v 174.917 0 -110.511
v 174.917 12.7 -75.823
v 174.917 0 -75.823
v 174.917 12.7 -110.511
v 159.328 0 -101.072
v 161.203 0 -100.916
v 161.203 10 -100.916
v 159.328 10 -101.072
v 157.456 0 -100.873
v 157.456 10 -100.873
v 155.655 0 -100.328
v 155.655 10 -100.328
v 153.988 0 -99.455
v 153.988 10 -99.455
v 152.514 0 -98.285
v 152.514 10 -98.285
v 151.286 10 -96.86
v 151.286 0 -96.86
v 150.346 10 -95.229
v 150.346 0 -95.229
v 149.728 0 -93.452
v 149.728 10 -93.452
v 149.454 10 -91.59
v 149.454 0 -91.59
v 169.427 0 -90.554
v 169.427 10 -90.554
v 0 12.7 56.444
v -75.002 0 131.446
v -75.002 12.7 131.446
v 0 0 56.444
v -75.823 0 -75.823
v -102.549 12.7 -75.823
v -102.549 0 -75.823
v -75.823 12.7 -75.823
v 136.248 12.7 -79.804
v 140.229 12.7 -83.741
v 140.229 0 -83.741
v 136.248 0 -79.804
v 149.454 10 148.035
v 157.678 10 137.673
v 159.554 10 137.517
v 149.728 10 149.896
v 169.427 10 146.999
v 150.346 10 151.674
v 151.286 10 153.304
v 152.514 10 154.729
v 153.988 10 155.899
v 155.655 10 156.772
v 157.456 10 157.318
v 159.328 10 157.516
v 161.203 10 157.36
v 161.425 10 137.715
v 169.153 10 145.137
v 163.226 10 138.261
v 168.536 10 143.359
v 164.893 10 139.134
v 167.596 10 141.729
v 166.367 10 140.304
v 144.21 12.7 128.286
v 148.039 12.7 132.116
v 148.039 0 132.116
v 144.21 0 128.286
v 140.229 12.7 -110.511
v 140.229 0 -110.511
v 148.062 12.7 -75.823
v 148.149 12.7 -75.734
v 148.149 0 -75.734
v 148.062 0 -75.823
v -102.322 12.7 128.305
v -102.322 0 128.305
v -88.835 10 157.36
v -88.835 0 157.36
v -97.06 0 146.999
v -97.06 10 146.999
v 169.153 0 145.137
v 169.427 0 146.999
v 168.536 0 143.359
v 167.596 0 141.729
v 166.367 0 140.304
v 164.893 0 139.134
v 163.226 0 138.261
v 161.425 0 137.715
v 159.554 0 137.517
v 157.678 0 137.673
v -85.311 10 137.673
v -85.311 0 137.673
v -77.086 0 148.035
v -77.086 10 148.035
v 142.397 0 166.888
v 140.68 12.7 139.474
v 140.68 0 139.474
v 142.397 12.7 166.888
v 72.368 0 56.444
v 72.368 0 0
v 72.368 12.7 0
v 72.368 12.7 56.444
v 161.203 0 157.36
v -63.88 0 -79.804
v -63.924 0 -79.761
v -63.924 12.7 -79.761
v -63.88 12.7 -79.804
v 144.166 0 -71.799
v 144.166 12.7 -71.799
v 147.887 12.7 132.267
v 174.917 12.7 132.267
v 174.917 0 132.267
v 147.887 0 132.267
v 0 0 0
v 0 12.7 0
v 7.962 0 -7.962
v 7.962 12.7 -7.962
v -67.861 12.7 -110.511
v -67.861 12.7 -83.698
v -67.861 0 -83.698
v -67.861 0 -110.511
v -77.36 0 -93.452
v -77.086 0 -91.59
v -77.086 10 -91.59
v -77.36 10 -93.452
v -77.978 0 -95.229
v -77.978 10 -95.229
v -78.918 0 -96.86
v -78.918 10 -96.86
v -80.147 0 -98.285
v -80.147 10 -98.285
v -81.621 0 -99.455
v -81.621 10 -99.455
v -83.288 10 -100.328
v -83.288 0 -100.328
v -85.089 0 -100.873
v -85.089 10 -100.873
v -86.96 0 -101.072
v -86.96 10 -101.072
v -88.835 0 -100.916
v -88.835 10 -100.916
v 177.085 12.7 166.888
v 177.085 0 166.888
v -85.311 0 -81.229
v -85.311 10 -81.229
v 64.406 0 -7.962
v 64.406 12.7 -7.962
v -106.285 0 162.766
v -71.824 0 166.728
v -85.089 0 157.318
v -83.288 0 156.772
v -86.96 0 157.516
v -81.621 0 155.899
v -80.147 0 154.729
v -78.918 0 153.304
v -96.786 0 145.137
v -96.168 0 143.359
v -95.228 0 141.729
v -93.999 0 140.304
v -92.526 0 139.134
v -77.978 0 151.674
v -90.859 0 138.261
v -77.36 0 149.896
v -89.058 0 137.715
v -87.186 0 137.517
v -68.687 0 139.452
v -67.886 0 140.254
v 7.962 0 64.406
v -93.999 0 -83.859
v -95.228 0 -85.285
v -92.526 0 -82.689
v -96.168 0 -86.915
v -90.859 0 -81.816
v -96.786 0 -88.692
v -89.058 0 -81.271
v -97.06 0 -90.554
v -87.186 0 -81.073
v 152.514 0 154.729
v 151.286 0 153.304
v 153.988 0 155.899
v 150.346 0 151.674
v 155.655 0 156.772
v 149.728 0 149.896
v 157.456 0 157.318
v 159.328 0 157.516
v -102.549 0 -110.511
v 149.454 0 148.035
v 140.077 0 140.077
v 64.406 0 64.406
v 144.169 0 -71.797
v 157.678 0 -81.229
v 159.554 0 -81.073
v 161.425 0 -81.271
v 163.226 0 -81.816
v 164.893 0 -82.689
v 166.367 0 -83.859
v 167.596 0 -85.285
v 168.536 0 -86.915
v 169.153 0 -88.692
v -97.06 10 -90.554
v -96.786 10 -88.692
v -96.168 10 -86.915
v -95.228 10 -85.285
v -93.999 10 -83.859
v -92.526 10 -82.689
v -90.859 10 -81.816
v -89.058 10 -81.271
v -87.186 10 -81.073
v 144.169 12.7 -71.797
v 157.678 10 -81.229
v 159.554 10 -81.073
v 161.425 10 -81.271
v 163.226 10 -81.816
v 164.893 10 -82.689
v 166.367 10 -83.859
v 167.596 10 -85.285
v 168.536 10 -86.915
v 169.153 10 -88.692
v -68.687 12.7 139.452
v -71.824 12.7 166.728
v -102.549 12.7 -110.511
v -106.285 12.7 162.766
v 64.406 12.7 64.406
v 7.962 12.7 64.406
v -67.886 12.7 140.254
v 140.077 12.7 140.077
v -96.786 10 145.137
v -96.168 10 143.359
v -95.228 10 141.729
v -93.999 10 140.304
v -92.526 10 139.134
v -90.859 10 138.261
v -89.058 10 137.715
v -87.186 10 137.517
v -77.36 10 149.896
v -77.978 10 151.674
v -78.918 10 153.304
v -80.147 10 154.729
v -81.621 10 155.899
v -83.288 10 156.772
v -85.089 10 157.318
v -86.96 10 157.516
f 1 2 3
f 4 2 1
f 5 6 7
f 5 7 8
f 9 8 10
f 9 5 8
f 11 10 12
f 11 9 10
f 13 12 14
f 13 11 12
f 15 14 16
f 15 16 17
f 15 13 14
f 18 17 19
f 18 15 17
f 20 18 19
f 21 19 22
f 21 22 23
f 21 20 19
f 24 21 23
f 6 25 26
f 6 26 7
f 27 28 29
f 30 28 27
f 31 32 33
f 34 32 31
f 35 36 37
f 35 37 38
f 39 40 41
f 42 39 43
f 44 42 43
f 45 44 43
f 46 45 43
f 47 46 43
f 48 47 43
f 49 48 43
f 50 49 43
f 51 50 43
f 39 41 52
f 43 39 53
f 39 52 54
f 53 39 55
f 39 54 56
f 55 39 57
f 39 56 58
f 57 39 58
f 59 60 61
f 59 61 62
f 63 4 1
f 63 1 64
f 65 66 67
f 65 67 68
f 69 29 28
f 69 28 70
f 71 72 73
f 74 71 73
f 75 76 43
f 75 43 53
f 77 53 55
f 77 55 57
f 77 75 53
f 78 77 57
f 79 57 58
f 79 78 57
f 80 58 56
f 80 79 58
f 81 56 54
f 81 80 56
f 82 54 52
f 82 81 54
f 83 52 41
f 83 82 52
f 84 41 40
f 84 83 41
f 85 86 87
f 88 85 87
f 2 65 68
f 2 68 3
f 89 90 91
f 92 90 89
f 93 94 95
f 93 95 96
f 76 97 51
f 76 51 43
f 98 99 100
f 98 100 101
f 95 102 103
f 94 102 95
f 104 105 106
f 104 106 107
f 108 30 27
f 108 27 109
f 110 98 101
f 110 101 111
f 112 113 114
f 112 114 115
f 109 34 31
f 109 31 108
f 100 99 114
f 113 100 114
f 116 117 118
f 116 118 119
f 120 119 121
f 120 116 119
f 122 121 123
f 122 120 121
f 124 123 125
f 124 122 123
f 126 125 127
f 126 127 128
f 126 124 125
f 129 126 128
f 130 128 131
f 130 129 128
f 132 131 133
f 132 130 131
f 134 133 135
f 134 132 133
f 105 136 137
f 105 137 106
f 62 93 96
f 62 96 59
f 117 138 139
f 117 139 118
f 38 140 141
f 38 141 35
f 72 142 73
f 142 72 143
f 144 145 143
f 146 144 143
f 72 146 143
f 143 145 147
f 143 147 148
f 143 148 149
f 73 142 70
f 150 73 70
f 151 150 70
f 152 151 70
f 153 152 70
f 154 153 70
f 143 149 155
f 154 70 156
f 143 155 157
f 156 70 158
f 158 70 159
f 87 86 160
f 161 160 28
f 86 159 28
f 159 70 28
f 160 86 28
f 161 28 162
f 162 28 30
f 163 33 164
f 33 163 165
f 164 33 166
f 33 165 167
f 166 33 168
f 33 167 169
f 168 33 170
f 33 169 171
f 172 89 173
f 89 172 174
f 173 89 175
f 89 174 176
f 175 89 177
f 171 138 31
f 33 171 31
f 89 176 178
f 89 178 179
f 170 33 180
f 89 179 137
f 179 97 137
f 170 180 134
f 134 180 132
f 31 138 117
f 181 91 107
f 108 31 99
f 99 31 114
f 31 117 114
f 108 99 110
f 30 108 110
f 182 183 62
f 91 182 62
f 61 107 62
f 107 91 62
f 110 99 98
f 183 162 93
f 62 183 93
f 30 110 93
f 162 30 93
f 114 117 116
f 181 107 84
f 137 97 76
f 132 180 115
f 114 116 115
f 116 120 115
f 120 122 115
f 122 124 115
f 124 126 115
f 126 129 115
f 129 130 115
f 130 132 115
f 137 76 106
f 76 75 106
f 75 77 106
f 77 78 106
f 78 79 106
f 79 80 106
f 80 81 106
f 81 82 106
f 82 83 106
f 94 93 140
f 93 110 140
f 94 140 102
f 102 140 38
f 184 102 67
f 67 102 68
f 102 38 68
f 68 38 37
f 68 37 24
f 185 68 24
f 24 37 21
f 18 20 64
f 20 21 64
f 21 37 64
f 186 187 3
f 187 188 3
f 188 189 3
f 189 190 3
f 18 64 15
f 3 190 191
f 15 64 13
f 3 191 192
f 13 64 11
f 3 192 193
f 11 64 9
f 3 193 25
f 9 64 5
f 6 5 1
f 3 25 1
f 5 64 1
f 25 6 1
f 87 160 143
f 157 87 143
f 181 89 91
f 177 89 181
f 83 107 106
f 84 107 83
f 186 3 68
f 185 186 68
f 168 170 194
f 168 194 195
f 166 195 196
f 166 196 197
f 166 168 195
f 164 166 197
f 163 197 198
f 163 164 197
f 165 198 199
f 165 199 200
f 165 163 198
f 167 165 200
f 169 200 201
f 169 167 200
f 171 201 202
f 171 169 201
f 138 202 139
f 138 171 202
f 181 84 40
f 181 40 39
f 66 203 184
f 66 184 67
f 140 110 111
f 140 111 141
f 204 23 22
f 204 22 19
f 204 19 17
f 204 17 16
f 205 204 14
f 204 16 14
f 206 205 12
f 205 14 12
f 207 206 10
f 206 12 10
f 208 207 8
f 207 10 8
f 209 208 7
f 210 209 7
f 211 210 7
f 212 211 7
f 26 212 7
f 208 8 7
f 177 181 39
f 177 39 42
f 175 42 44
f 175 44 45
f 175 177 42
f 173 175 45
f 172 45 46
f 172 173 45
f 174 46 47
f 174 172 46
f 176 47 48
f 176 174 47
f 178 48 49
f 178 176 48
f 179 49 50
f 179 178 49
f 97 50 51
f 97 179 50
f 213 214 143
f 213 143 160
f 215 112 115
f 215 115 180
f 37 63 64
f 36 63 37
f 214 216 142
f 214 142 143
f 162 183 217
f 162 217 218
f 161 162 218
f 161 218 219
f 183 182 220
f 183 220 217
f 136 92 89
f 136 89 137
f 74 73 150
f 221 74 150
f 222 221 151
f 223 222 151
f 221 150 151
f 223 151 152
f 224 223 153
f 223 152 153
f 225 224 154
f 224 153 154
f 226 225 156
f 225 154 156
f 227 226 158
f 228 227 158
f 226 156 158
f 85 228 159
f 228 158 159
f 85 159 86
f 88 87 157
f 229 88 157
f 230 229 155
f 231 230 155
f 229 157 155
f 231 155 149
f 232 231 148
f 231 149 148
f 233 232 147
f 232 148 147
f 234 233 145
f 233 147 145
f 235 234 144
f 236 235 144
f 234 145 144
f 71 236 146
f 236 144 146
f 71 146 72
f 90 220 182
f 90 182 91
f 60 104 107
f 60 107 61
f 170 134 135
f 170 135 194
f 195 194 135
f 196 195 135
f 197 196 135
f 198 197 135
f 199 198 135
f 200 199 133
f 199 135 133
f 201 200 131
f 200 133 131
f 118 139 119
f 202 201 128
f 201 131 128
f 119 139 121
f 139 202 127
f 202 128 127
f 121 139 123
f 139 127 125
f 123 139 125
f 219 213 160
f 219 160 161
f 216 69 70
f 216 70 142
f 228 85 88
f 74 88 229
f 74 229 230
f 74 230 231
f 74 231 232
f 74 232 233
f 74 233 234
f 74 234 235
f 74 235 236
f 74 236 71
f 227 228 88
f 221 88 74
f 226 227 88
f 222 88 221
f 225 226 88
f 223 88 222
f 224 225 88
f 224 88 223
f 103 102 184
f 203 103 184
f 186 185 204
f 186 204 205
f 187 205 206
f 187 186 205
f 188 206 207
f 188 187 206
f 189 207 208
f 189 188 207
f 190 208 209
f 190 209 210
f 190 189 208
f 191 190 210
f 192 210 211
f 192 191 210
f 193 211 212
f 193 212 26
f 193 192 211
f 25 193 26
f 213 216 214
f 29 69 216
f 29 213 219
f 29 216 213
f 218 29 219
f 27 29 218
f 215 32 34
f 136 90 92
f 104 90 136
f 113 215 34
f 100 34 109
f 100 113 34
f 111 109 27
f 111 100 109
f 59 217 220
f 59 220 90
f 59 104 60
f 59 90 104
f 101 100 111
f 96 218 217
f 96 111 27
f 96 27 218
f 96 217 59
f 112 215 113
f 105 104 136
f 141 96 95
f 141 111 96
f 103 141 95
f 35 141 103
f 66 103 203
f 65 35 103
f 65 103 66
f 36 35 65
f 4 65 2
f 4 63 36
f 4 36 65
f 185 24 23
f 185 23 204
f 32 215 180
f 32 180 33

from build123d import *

# Parameters (mm, degrees)
BOSS_EXTRUDE1_DEPTH = 12.7
BOSS_EXTRUDE6_DEPTH = 12.7
CUT_EXTRUDE1_DEPTH  = 10


with BuildPart() as part:
    # Sketch1 → Boss-Extrude1 (new body)
    with BuildSketch(Plane(origin=(0, 0, 0), x_dir=(1, 0, 0), z_dir=(0, 1, 0))):
        Polygon((0, 0), (-71.842048969, 71.842048969), (-63.880459669, 79.803638268), (7.961589299, 7.961589299), (64.406033744, 7.961589299), (136.248082712, 79.803638268), (144.209672011, 71.842048969), (72.367623043, 0), (72.367623043, -56.444444444), (144.209672011, -128.286493413), (136.248082712, -136.248082712), (64.406033744, -64.406033744), (7.961589299, -64.406033744), (-63.880459669, -136.248082712), (-71.842048969, -128.286493413), (0, -56.444444444), align=None)
    extrude(amount=BOSS_EXTRUDE1_DEPTH)

    # Sketch4 → Boss-Extrude6 (add)
    with BuildSketch(Plane(origin=(0, 12.7, 0), x_dir=(1, 0, 0), z_dir=(0, 1, 0))):
        Polygon((-67.861254319, 110.511019008), (-102.549429709, 110.511019008), (-102.549429709, 75.822843618), (-75.822843618, 75.822843618), (-67.904353545, 83.741333692), (-67.861254319, 83.698234466), align=None)
        Polygon((-63.923558895, 79.760539042), (-67.861254319, 83.698234466), (-67.861254319, 75.822843618), align=None)
        Polygon((-67.861254319, 75.822843618), (-67.861254319, 83.698234466), (-67.904353545, 83.741333692), (-75.822843618, 75.822843618), align=None)
        Polygon((-67.861254319, 75.822843618), (-75.822843618, 75.822843618), (-71.842048969, 71.842048969), align=None)
        Polygon((148.06163561, 75.822843618), (140.228877362, 75.822843618), (140.228877362, 83.741333692), (136.248082712, 79.803638268), (144.168507311, 71.79652231), (148.14930196, 75.734217734), align=None)
        Polygon((140.228877362, 83.741333692), (140.228877362, 75.822843618), (148.06163561, 75.822843618), align=None)
        Polygon((140.228877362, 110.511019008), (140.228877362, 83.741333692), (148.06163561, 75.822843618), (174.917052842, 75.822843618), (174.917052842, 110.511019008), align=None)
        Polygon((144.209672011, -128.286493413), (140.228877362, -132.267288063), (147.887031193, -132.267288063), (148.038748927, -132.115570329), align=None)
        Polygon((147.887031193, -132.267288063), (140.228877362, -132.267288063), (140.680194952, -139.474124303), align=None)
        Polygon((140.680194952, -139.474124303), (140.228877362, -132.267288063), (136.248082712, -136.248082712), (140.077159628, -140.077159628), align=None)
        Polygon((174.917052842, -132.267288063), (147.887031193, -132.267288063), (140.680194952, -139.474124303), (142.396926606, -166.887644511), (177.085102086, -166.887644511), align=None)
        Polygon((-63.880459669, -136.248082712), (-67.861254319, -132.267288063), (-68.687385193, -139.452020723), (-67.885891437, -140.25351448), align=None)
        Polygon((-68.687385193, -139.452020723), (-67.861254319, -132.267288063), (-75.001794215, -131.446238659), (-75.847480736, -132.29192518), align=None)
        Polygon((-75.001794215, -131.446238659), (-67.861254319, -132.267288063), (-71.842048969, -128.286493413), align=None)
        Polygon((-71.823738367, -166.728400034), (-68.687385193, -139.452020723), (-75.847480736, -132.29192518), (-75.001794215, -131.446238659), (-102.32236629, -128.304804015), (-106.284850338, -162.765915986), align=None)
    extrude(amount=-BOSS_EXTRUDE6_DEPTH)

    # Sketch10 → Cut-Extrude1 (cut)
    with BuildSketch(Plane(origin=(0, 0, 0), x_dir=(-1, 0, 0), z_dir=(0, -1, 0))):
        with BuildLine():
            ThreePointArc((77.08647461, 91.590101085), (80.856009684, 98.904678295), (88.835255683, 100.915665051))
            Line((88.835255683, 100.915665051), (97.059630047, 90.554214075))
            ThreePointArc((97.059630047, 90.554214075), (93.290094973, 83.239636865), (85.310848974, 81.228650109))
            Line((85.310848974, 81.228650109), (77.08647461, 91.590101085))
        make_face()
        with BuildLine():
            Line((-169.42725309, 90.554214075), (-161.202878726, 100.915665051))
            ThreePointArc((-161.202878726, 100.915665051), (-153.223632727, 98.904678295), (-149.454097653, 91.590101085))
            Line((-149.454097653, 91.590101085), (-157.678472017, 81.228650109))
            ThreePointArc((-157.678472017, 81.228650109), (-165.657718016, 83.239636865), (-169.42725309, 90.554214075))
        make_face()
        with BuildLine():
            ThreePointArc((-149.454097653, -148.034545529), (-153.223632727, -155.34912274), (-161.202878726, -157.360109496))
            Line((-161.202878726, -157.360109496), (-169.42725309, -146.99865852))
            ThreePointArc((-169.42725309, -146.99865852), (-165.657718016, -139.684081309), (-157.678472017, -137.673094553))
            Line((-157.678472017, -137.673094553), (-149.454097653, -148.034545529))
        make_face()
        with BuildLine():
            ThreePointArc((77.08647461, -148.034545529), (80.856009684, -155.34912274), (88.835255683, -157.360109496))
            Line((88.835255683, -157.360109496), (97.059630047, -146.99865852))
            ThreePointArc((97.059630047, -146.99865852), (93.290094973, -139.684081309), (85.310848974, -137.673094553))
            Line((85.310848974, -137.673094553), (77.08647461, -148.034545529))
        make_face()
    extrude(amount=-CUT_EXTRUDE1_DEPTH, mode=Mode.SUBTRACT)


solid = part.part
